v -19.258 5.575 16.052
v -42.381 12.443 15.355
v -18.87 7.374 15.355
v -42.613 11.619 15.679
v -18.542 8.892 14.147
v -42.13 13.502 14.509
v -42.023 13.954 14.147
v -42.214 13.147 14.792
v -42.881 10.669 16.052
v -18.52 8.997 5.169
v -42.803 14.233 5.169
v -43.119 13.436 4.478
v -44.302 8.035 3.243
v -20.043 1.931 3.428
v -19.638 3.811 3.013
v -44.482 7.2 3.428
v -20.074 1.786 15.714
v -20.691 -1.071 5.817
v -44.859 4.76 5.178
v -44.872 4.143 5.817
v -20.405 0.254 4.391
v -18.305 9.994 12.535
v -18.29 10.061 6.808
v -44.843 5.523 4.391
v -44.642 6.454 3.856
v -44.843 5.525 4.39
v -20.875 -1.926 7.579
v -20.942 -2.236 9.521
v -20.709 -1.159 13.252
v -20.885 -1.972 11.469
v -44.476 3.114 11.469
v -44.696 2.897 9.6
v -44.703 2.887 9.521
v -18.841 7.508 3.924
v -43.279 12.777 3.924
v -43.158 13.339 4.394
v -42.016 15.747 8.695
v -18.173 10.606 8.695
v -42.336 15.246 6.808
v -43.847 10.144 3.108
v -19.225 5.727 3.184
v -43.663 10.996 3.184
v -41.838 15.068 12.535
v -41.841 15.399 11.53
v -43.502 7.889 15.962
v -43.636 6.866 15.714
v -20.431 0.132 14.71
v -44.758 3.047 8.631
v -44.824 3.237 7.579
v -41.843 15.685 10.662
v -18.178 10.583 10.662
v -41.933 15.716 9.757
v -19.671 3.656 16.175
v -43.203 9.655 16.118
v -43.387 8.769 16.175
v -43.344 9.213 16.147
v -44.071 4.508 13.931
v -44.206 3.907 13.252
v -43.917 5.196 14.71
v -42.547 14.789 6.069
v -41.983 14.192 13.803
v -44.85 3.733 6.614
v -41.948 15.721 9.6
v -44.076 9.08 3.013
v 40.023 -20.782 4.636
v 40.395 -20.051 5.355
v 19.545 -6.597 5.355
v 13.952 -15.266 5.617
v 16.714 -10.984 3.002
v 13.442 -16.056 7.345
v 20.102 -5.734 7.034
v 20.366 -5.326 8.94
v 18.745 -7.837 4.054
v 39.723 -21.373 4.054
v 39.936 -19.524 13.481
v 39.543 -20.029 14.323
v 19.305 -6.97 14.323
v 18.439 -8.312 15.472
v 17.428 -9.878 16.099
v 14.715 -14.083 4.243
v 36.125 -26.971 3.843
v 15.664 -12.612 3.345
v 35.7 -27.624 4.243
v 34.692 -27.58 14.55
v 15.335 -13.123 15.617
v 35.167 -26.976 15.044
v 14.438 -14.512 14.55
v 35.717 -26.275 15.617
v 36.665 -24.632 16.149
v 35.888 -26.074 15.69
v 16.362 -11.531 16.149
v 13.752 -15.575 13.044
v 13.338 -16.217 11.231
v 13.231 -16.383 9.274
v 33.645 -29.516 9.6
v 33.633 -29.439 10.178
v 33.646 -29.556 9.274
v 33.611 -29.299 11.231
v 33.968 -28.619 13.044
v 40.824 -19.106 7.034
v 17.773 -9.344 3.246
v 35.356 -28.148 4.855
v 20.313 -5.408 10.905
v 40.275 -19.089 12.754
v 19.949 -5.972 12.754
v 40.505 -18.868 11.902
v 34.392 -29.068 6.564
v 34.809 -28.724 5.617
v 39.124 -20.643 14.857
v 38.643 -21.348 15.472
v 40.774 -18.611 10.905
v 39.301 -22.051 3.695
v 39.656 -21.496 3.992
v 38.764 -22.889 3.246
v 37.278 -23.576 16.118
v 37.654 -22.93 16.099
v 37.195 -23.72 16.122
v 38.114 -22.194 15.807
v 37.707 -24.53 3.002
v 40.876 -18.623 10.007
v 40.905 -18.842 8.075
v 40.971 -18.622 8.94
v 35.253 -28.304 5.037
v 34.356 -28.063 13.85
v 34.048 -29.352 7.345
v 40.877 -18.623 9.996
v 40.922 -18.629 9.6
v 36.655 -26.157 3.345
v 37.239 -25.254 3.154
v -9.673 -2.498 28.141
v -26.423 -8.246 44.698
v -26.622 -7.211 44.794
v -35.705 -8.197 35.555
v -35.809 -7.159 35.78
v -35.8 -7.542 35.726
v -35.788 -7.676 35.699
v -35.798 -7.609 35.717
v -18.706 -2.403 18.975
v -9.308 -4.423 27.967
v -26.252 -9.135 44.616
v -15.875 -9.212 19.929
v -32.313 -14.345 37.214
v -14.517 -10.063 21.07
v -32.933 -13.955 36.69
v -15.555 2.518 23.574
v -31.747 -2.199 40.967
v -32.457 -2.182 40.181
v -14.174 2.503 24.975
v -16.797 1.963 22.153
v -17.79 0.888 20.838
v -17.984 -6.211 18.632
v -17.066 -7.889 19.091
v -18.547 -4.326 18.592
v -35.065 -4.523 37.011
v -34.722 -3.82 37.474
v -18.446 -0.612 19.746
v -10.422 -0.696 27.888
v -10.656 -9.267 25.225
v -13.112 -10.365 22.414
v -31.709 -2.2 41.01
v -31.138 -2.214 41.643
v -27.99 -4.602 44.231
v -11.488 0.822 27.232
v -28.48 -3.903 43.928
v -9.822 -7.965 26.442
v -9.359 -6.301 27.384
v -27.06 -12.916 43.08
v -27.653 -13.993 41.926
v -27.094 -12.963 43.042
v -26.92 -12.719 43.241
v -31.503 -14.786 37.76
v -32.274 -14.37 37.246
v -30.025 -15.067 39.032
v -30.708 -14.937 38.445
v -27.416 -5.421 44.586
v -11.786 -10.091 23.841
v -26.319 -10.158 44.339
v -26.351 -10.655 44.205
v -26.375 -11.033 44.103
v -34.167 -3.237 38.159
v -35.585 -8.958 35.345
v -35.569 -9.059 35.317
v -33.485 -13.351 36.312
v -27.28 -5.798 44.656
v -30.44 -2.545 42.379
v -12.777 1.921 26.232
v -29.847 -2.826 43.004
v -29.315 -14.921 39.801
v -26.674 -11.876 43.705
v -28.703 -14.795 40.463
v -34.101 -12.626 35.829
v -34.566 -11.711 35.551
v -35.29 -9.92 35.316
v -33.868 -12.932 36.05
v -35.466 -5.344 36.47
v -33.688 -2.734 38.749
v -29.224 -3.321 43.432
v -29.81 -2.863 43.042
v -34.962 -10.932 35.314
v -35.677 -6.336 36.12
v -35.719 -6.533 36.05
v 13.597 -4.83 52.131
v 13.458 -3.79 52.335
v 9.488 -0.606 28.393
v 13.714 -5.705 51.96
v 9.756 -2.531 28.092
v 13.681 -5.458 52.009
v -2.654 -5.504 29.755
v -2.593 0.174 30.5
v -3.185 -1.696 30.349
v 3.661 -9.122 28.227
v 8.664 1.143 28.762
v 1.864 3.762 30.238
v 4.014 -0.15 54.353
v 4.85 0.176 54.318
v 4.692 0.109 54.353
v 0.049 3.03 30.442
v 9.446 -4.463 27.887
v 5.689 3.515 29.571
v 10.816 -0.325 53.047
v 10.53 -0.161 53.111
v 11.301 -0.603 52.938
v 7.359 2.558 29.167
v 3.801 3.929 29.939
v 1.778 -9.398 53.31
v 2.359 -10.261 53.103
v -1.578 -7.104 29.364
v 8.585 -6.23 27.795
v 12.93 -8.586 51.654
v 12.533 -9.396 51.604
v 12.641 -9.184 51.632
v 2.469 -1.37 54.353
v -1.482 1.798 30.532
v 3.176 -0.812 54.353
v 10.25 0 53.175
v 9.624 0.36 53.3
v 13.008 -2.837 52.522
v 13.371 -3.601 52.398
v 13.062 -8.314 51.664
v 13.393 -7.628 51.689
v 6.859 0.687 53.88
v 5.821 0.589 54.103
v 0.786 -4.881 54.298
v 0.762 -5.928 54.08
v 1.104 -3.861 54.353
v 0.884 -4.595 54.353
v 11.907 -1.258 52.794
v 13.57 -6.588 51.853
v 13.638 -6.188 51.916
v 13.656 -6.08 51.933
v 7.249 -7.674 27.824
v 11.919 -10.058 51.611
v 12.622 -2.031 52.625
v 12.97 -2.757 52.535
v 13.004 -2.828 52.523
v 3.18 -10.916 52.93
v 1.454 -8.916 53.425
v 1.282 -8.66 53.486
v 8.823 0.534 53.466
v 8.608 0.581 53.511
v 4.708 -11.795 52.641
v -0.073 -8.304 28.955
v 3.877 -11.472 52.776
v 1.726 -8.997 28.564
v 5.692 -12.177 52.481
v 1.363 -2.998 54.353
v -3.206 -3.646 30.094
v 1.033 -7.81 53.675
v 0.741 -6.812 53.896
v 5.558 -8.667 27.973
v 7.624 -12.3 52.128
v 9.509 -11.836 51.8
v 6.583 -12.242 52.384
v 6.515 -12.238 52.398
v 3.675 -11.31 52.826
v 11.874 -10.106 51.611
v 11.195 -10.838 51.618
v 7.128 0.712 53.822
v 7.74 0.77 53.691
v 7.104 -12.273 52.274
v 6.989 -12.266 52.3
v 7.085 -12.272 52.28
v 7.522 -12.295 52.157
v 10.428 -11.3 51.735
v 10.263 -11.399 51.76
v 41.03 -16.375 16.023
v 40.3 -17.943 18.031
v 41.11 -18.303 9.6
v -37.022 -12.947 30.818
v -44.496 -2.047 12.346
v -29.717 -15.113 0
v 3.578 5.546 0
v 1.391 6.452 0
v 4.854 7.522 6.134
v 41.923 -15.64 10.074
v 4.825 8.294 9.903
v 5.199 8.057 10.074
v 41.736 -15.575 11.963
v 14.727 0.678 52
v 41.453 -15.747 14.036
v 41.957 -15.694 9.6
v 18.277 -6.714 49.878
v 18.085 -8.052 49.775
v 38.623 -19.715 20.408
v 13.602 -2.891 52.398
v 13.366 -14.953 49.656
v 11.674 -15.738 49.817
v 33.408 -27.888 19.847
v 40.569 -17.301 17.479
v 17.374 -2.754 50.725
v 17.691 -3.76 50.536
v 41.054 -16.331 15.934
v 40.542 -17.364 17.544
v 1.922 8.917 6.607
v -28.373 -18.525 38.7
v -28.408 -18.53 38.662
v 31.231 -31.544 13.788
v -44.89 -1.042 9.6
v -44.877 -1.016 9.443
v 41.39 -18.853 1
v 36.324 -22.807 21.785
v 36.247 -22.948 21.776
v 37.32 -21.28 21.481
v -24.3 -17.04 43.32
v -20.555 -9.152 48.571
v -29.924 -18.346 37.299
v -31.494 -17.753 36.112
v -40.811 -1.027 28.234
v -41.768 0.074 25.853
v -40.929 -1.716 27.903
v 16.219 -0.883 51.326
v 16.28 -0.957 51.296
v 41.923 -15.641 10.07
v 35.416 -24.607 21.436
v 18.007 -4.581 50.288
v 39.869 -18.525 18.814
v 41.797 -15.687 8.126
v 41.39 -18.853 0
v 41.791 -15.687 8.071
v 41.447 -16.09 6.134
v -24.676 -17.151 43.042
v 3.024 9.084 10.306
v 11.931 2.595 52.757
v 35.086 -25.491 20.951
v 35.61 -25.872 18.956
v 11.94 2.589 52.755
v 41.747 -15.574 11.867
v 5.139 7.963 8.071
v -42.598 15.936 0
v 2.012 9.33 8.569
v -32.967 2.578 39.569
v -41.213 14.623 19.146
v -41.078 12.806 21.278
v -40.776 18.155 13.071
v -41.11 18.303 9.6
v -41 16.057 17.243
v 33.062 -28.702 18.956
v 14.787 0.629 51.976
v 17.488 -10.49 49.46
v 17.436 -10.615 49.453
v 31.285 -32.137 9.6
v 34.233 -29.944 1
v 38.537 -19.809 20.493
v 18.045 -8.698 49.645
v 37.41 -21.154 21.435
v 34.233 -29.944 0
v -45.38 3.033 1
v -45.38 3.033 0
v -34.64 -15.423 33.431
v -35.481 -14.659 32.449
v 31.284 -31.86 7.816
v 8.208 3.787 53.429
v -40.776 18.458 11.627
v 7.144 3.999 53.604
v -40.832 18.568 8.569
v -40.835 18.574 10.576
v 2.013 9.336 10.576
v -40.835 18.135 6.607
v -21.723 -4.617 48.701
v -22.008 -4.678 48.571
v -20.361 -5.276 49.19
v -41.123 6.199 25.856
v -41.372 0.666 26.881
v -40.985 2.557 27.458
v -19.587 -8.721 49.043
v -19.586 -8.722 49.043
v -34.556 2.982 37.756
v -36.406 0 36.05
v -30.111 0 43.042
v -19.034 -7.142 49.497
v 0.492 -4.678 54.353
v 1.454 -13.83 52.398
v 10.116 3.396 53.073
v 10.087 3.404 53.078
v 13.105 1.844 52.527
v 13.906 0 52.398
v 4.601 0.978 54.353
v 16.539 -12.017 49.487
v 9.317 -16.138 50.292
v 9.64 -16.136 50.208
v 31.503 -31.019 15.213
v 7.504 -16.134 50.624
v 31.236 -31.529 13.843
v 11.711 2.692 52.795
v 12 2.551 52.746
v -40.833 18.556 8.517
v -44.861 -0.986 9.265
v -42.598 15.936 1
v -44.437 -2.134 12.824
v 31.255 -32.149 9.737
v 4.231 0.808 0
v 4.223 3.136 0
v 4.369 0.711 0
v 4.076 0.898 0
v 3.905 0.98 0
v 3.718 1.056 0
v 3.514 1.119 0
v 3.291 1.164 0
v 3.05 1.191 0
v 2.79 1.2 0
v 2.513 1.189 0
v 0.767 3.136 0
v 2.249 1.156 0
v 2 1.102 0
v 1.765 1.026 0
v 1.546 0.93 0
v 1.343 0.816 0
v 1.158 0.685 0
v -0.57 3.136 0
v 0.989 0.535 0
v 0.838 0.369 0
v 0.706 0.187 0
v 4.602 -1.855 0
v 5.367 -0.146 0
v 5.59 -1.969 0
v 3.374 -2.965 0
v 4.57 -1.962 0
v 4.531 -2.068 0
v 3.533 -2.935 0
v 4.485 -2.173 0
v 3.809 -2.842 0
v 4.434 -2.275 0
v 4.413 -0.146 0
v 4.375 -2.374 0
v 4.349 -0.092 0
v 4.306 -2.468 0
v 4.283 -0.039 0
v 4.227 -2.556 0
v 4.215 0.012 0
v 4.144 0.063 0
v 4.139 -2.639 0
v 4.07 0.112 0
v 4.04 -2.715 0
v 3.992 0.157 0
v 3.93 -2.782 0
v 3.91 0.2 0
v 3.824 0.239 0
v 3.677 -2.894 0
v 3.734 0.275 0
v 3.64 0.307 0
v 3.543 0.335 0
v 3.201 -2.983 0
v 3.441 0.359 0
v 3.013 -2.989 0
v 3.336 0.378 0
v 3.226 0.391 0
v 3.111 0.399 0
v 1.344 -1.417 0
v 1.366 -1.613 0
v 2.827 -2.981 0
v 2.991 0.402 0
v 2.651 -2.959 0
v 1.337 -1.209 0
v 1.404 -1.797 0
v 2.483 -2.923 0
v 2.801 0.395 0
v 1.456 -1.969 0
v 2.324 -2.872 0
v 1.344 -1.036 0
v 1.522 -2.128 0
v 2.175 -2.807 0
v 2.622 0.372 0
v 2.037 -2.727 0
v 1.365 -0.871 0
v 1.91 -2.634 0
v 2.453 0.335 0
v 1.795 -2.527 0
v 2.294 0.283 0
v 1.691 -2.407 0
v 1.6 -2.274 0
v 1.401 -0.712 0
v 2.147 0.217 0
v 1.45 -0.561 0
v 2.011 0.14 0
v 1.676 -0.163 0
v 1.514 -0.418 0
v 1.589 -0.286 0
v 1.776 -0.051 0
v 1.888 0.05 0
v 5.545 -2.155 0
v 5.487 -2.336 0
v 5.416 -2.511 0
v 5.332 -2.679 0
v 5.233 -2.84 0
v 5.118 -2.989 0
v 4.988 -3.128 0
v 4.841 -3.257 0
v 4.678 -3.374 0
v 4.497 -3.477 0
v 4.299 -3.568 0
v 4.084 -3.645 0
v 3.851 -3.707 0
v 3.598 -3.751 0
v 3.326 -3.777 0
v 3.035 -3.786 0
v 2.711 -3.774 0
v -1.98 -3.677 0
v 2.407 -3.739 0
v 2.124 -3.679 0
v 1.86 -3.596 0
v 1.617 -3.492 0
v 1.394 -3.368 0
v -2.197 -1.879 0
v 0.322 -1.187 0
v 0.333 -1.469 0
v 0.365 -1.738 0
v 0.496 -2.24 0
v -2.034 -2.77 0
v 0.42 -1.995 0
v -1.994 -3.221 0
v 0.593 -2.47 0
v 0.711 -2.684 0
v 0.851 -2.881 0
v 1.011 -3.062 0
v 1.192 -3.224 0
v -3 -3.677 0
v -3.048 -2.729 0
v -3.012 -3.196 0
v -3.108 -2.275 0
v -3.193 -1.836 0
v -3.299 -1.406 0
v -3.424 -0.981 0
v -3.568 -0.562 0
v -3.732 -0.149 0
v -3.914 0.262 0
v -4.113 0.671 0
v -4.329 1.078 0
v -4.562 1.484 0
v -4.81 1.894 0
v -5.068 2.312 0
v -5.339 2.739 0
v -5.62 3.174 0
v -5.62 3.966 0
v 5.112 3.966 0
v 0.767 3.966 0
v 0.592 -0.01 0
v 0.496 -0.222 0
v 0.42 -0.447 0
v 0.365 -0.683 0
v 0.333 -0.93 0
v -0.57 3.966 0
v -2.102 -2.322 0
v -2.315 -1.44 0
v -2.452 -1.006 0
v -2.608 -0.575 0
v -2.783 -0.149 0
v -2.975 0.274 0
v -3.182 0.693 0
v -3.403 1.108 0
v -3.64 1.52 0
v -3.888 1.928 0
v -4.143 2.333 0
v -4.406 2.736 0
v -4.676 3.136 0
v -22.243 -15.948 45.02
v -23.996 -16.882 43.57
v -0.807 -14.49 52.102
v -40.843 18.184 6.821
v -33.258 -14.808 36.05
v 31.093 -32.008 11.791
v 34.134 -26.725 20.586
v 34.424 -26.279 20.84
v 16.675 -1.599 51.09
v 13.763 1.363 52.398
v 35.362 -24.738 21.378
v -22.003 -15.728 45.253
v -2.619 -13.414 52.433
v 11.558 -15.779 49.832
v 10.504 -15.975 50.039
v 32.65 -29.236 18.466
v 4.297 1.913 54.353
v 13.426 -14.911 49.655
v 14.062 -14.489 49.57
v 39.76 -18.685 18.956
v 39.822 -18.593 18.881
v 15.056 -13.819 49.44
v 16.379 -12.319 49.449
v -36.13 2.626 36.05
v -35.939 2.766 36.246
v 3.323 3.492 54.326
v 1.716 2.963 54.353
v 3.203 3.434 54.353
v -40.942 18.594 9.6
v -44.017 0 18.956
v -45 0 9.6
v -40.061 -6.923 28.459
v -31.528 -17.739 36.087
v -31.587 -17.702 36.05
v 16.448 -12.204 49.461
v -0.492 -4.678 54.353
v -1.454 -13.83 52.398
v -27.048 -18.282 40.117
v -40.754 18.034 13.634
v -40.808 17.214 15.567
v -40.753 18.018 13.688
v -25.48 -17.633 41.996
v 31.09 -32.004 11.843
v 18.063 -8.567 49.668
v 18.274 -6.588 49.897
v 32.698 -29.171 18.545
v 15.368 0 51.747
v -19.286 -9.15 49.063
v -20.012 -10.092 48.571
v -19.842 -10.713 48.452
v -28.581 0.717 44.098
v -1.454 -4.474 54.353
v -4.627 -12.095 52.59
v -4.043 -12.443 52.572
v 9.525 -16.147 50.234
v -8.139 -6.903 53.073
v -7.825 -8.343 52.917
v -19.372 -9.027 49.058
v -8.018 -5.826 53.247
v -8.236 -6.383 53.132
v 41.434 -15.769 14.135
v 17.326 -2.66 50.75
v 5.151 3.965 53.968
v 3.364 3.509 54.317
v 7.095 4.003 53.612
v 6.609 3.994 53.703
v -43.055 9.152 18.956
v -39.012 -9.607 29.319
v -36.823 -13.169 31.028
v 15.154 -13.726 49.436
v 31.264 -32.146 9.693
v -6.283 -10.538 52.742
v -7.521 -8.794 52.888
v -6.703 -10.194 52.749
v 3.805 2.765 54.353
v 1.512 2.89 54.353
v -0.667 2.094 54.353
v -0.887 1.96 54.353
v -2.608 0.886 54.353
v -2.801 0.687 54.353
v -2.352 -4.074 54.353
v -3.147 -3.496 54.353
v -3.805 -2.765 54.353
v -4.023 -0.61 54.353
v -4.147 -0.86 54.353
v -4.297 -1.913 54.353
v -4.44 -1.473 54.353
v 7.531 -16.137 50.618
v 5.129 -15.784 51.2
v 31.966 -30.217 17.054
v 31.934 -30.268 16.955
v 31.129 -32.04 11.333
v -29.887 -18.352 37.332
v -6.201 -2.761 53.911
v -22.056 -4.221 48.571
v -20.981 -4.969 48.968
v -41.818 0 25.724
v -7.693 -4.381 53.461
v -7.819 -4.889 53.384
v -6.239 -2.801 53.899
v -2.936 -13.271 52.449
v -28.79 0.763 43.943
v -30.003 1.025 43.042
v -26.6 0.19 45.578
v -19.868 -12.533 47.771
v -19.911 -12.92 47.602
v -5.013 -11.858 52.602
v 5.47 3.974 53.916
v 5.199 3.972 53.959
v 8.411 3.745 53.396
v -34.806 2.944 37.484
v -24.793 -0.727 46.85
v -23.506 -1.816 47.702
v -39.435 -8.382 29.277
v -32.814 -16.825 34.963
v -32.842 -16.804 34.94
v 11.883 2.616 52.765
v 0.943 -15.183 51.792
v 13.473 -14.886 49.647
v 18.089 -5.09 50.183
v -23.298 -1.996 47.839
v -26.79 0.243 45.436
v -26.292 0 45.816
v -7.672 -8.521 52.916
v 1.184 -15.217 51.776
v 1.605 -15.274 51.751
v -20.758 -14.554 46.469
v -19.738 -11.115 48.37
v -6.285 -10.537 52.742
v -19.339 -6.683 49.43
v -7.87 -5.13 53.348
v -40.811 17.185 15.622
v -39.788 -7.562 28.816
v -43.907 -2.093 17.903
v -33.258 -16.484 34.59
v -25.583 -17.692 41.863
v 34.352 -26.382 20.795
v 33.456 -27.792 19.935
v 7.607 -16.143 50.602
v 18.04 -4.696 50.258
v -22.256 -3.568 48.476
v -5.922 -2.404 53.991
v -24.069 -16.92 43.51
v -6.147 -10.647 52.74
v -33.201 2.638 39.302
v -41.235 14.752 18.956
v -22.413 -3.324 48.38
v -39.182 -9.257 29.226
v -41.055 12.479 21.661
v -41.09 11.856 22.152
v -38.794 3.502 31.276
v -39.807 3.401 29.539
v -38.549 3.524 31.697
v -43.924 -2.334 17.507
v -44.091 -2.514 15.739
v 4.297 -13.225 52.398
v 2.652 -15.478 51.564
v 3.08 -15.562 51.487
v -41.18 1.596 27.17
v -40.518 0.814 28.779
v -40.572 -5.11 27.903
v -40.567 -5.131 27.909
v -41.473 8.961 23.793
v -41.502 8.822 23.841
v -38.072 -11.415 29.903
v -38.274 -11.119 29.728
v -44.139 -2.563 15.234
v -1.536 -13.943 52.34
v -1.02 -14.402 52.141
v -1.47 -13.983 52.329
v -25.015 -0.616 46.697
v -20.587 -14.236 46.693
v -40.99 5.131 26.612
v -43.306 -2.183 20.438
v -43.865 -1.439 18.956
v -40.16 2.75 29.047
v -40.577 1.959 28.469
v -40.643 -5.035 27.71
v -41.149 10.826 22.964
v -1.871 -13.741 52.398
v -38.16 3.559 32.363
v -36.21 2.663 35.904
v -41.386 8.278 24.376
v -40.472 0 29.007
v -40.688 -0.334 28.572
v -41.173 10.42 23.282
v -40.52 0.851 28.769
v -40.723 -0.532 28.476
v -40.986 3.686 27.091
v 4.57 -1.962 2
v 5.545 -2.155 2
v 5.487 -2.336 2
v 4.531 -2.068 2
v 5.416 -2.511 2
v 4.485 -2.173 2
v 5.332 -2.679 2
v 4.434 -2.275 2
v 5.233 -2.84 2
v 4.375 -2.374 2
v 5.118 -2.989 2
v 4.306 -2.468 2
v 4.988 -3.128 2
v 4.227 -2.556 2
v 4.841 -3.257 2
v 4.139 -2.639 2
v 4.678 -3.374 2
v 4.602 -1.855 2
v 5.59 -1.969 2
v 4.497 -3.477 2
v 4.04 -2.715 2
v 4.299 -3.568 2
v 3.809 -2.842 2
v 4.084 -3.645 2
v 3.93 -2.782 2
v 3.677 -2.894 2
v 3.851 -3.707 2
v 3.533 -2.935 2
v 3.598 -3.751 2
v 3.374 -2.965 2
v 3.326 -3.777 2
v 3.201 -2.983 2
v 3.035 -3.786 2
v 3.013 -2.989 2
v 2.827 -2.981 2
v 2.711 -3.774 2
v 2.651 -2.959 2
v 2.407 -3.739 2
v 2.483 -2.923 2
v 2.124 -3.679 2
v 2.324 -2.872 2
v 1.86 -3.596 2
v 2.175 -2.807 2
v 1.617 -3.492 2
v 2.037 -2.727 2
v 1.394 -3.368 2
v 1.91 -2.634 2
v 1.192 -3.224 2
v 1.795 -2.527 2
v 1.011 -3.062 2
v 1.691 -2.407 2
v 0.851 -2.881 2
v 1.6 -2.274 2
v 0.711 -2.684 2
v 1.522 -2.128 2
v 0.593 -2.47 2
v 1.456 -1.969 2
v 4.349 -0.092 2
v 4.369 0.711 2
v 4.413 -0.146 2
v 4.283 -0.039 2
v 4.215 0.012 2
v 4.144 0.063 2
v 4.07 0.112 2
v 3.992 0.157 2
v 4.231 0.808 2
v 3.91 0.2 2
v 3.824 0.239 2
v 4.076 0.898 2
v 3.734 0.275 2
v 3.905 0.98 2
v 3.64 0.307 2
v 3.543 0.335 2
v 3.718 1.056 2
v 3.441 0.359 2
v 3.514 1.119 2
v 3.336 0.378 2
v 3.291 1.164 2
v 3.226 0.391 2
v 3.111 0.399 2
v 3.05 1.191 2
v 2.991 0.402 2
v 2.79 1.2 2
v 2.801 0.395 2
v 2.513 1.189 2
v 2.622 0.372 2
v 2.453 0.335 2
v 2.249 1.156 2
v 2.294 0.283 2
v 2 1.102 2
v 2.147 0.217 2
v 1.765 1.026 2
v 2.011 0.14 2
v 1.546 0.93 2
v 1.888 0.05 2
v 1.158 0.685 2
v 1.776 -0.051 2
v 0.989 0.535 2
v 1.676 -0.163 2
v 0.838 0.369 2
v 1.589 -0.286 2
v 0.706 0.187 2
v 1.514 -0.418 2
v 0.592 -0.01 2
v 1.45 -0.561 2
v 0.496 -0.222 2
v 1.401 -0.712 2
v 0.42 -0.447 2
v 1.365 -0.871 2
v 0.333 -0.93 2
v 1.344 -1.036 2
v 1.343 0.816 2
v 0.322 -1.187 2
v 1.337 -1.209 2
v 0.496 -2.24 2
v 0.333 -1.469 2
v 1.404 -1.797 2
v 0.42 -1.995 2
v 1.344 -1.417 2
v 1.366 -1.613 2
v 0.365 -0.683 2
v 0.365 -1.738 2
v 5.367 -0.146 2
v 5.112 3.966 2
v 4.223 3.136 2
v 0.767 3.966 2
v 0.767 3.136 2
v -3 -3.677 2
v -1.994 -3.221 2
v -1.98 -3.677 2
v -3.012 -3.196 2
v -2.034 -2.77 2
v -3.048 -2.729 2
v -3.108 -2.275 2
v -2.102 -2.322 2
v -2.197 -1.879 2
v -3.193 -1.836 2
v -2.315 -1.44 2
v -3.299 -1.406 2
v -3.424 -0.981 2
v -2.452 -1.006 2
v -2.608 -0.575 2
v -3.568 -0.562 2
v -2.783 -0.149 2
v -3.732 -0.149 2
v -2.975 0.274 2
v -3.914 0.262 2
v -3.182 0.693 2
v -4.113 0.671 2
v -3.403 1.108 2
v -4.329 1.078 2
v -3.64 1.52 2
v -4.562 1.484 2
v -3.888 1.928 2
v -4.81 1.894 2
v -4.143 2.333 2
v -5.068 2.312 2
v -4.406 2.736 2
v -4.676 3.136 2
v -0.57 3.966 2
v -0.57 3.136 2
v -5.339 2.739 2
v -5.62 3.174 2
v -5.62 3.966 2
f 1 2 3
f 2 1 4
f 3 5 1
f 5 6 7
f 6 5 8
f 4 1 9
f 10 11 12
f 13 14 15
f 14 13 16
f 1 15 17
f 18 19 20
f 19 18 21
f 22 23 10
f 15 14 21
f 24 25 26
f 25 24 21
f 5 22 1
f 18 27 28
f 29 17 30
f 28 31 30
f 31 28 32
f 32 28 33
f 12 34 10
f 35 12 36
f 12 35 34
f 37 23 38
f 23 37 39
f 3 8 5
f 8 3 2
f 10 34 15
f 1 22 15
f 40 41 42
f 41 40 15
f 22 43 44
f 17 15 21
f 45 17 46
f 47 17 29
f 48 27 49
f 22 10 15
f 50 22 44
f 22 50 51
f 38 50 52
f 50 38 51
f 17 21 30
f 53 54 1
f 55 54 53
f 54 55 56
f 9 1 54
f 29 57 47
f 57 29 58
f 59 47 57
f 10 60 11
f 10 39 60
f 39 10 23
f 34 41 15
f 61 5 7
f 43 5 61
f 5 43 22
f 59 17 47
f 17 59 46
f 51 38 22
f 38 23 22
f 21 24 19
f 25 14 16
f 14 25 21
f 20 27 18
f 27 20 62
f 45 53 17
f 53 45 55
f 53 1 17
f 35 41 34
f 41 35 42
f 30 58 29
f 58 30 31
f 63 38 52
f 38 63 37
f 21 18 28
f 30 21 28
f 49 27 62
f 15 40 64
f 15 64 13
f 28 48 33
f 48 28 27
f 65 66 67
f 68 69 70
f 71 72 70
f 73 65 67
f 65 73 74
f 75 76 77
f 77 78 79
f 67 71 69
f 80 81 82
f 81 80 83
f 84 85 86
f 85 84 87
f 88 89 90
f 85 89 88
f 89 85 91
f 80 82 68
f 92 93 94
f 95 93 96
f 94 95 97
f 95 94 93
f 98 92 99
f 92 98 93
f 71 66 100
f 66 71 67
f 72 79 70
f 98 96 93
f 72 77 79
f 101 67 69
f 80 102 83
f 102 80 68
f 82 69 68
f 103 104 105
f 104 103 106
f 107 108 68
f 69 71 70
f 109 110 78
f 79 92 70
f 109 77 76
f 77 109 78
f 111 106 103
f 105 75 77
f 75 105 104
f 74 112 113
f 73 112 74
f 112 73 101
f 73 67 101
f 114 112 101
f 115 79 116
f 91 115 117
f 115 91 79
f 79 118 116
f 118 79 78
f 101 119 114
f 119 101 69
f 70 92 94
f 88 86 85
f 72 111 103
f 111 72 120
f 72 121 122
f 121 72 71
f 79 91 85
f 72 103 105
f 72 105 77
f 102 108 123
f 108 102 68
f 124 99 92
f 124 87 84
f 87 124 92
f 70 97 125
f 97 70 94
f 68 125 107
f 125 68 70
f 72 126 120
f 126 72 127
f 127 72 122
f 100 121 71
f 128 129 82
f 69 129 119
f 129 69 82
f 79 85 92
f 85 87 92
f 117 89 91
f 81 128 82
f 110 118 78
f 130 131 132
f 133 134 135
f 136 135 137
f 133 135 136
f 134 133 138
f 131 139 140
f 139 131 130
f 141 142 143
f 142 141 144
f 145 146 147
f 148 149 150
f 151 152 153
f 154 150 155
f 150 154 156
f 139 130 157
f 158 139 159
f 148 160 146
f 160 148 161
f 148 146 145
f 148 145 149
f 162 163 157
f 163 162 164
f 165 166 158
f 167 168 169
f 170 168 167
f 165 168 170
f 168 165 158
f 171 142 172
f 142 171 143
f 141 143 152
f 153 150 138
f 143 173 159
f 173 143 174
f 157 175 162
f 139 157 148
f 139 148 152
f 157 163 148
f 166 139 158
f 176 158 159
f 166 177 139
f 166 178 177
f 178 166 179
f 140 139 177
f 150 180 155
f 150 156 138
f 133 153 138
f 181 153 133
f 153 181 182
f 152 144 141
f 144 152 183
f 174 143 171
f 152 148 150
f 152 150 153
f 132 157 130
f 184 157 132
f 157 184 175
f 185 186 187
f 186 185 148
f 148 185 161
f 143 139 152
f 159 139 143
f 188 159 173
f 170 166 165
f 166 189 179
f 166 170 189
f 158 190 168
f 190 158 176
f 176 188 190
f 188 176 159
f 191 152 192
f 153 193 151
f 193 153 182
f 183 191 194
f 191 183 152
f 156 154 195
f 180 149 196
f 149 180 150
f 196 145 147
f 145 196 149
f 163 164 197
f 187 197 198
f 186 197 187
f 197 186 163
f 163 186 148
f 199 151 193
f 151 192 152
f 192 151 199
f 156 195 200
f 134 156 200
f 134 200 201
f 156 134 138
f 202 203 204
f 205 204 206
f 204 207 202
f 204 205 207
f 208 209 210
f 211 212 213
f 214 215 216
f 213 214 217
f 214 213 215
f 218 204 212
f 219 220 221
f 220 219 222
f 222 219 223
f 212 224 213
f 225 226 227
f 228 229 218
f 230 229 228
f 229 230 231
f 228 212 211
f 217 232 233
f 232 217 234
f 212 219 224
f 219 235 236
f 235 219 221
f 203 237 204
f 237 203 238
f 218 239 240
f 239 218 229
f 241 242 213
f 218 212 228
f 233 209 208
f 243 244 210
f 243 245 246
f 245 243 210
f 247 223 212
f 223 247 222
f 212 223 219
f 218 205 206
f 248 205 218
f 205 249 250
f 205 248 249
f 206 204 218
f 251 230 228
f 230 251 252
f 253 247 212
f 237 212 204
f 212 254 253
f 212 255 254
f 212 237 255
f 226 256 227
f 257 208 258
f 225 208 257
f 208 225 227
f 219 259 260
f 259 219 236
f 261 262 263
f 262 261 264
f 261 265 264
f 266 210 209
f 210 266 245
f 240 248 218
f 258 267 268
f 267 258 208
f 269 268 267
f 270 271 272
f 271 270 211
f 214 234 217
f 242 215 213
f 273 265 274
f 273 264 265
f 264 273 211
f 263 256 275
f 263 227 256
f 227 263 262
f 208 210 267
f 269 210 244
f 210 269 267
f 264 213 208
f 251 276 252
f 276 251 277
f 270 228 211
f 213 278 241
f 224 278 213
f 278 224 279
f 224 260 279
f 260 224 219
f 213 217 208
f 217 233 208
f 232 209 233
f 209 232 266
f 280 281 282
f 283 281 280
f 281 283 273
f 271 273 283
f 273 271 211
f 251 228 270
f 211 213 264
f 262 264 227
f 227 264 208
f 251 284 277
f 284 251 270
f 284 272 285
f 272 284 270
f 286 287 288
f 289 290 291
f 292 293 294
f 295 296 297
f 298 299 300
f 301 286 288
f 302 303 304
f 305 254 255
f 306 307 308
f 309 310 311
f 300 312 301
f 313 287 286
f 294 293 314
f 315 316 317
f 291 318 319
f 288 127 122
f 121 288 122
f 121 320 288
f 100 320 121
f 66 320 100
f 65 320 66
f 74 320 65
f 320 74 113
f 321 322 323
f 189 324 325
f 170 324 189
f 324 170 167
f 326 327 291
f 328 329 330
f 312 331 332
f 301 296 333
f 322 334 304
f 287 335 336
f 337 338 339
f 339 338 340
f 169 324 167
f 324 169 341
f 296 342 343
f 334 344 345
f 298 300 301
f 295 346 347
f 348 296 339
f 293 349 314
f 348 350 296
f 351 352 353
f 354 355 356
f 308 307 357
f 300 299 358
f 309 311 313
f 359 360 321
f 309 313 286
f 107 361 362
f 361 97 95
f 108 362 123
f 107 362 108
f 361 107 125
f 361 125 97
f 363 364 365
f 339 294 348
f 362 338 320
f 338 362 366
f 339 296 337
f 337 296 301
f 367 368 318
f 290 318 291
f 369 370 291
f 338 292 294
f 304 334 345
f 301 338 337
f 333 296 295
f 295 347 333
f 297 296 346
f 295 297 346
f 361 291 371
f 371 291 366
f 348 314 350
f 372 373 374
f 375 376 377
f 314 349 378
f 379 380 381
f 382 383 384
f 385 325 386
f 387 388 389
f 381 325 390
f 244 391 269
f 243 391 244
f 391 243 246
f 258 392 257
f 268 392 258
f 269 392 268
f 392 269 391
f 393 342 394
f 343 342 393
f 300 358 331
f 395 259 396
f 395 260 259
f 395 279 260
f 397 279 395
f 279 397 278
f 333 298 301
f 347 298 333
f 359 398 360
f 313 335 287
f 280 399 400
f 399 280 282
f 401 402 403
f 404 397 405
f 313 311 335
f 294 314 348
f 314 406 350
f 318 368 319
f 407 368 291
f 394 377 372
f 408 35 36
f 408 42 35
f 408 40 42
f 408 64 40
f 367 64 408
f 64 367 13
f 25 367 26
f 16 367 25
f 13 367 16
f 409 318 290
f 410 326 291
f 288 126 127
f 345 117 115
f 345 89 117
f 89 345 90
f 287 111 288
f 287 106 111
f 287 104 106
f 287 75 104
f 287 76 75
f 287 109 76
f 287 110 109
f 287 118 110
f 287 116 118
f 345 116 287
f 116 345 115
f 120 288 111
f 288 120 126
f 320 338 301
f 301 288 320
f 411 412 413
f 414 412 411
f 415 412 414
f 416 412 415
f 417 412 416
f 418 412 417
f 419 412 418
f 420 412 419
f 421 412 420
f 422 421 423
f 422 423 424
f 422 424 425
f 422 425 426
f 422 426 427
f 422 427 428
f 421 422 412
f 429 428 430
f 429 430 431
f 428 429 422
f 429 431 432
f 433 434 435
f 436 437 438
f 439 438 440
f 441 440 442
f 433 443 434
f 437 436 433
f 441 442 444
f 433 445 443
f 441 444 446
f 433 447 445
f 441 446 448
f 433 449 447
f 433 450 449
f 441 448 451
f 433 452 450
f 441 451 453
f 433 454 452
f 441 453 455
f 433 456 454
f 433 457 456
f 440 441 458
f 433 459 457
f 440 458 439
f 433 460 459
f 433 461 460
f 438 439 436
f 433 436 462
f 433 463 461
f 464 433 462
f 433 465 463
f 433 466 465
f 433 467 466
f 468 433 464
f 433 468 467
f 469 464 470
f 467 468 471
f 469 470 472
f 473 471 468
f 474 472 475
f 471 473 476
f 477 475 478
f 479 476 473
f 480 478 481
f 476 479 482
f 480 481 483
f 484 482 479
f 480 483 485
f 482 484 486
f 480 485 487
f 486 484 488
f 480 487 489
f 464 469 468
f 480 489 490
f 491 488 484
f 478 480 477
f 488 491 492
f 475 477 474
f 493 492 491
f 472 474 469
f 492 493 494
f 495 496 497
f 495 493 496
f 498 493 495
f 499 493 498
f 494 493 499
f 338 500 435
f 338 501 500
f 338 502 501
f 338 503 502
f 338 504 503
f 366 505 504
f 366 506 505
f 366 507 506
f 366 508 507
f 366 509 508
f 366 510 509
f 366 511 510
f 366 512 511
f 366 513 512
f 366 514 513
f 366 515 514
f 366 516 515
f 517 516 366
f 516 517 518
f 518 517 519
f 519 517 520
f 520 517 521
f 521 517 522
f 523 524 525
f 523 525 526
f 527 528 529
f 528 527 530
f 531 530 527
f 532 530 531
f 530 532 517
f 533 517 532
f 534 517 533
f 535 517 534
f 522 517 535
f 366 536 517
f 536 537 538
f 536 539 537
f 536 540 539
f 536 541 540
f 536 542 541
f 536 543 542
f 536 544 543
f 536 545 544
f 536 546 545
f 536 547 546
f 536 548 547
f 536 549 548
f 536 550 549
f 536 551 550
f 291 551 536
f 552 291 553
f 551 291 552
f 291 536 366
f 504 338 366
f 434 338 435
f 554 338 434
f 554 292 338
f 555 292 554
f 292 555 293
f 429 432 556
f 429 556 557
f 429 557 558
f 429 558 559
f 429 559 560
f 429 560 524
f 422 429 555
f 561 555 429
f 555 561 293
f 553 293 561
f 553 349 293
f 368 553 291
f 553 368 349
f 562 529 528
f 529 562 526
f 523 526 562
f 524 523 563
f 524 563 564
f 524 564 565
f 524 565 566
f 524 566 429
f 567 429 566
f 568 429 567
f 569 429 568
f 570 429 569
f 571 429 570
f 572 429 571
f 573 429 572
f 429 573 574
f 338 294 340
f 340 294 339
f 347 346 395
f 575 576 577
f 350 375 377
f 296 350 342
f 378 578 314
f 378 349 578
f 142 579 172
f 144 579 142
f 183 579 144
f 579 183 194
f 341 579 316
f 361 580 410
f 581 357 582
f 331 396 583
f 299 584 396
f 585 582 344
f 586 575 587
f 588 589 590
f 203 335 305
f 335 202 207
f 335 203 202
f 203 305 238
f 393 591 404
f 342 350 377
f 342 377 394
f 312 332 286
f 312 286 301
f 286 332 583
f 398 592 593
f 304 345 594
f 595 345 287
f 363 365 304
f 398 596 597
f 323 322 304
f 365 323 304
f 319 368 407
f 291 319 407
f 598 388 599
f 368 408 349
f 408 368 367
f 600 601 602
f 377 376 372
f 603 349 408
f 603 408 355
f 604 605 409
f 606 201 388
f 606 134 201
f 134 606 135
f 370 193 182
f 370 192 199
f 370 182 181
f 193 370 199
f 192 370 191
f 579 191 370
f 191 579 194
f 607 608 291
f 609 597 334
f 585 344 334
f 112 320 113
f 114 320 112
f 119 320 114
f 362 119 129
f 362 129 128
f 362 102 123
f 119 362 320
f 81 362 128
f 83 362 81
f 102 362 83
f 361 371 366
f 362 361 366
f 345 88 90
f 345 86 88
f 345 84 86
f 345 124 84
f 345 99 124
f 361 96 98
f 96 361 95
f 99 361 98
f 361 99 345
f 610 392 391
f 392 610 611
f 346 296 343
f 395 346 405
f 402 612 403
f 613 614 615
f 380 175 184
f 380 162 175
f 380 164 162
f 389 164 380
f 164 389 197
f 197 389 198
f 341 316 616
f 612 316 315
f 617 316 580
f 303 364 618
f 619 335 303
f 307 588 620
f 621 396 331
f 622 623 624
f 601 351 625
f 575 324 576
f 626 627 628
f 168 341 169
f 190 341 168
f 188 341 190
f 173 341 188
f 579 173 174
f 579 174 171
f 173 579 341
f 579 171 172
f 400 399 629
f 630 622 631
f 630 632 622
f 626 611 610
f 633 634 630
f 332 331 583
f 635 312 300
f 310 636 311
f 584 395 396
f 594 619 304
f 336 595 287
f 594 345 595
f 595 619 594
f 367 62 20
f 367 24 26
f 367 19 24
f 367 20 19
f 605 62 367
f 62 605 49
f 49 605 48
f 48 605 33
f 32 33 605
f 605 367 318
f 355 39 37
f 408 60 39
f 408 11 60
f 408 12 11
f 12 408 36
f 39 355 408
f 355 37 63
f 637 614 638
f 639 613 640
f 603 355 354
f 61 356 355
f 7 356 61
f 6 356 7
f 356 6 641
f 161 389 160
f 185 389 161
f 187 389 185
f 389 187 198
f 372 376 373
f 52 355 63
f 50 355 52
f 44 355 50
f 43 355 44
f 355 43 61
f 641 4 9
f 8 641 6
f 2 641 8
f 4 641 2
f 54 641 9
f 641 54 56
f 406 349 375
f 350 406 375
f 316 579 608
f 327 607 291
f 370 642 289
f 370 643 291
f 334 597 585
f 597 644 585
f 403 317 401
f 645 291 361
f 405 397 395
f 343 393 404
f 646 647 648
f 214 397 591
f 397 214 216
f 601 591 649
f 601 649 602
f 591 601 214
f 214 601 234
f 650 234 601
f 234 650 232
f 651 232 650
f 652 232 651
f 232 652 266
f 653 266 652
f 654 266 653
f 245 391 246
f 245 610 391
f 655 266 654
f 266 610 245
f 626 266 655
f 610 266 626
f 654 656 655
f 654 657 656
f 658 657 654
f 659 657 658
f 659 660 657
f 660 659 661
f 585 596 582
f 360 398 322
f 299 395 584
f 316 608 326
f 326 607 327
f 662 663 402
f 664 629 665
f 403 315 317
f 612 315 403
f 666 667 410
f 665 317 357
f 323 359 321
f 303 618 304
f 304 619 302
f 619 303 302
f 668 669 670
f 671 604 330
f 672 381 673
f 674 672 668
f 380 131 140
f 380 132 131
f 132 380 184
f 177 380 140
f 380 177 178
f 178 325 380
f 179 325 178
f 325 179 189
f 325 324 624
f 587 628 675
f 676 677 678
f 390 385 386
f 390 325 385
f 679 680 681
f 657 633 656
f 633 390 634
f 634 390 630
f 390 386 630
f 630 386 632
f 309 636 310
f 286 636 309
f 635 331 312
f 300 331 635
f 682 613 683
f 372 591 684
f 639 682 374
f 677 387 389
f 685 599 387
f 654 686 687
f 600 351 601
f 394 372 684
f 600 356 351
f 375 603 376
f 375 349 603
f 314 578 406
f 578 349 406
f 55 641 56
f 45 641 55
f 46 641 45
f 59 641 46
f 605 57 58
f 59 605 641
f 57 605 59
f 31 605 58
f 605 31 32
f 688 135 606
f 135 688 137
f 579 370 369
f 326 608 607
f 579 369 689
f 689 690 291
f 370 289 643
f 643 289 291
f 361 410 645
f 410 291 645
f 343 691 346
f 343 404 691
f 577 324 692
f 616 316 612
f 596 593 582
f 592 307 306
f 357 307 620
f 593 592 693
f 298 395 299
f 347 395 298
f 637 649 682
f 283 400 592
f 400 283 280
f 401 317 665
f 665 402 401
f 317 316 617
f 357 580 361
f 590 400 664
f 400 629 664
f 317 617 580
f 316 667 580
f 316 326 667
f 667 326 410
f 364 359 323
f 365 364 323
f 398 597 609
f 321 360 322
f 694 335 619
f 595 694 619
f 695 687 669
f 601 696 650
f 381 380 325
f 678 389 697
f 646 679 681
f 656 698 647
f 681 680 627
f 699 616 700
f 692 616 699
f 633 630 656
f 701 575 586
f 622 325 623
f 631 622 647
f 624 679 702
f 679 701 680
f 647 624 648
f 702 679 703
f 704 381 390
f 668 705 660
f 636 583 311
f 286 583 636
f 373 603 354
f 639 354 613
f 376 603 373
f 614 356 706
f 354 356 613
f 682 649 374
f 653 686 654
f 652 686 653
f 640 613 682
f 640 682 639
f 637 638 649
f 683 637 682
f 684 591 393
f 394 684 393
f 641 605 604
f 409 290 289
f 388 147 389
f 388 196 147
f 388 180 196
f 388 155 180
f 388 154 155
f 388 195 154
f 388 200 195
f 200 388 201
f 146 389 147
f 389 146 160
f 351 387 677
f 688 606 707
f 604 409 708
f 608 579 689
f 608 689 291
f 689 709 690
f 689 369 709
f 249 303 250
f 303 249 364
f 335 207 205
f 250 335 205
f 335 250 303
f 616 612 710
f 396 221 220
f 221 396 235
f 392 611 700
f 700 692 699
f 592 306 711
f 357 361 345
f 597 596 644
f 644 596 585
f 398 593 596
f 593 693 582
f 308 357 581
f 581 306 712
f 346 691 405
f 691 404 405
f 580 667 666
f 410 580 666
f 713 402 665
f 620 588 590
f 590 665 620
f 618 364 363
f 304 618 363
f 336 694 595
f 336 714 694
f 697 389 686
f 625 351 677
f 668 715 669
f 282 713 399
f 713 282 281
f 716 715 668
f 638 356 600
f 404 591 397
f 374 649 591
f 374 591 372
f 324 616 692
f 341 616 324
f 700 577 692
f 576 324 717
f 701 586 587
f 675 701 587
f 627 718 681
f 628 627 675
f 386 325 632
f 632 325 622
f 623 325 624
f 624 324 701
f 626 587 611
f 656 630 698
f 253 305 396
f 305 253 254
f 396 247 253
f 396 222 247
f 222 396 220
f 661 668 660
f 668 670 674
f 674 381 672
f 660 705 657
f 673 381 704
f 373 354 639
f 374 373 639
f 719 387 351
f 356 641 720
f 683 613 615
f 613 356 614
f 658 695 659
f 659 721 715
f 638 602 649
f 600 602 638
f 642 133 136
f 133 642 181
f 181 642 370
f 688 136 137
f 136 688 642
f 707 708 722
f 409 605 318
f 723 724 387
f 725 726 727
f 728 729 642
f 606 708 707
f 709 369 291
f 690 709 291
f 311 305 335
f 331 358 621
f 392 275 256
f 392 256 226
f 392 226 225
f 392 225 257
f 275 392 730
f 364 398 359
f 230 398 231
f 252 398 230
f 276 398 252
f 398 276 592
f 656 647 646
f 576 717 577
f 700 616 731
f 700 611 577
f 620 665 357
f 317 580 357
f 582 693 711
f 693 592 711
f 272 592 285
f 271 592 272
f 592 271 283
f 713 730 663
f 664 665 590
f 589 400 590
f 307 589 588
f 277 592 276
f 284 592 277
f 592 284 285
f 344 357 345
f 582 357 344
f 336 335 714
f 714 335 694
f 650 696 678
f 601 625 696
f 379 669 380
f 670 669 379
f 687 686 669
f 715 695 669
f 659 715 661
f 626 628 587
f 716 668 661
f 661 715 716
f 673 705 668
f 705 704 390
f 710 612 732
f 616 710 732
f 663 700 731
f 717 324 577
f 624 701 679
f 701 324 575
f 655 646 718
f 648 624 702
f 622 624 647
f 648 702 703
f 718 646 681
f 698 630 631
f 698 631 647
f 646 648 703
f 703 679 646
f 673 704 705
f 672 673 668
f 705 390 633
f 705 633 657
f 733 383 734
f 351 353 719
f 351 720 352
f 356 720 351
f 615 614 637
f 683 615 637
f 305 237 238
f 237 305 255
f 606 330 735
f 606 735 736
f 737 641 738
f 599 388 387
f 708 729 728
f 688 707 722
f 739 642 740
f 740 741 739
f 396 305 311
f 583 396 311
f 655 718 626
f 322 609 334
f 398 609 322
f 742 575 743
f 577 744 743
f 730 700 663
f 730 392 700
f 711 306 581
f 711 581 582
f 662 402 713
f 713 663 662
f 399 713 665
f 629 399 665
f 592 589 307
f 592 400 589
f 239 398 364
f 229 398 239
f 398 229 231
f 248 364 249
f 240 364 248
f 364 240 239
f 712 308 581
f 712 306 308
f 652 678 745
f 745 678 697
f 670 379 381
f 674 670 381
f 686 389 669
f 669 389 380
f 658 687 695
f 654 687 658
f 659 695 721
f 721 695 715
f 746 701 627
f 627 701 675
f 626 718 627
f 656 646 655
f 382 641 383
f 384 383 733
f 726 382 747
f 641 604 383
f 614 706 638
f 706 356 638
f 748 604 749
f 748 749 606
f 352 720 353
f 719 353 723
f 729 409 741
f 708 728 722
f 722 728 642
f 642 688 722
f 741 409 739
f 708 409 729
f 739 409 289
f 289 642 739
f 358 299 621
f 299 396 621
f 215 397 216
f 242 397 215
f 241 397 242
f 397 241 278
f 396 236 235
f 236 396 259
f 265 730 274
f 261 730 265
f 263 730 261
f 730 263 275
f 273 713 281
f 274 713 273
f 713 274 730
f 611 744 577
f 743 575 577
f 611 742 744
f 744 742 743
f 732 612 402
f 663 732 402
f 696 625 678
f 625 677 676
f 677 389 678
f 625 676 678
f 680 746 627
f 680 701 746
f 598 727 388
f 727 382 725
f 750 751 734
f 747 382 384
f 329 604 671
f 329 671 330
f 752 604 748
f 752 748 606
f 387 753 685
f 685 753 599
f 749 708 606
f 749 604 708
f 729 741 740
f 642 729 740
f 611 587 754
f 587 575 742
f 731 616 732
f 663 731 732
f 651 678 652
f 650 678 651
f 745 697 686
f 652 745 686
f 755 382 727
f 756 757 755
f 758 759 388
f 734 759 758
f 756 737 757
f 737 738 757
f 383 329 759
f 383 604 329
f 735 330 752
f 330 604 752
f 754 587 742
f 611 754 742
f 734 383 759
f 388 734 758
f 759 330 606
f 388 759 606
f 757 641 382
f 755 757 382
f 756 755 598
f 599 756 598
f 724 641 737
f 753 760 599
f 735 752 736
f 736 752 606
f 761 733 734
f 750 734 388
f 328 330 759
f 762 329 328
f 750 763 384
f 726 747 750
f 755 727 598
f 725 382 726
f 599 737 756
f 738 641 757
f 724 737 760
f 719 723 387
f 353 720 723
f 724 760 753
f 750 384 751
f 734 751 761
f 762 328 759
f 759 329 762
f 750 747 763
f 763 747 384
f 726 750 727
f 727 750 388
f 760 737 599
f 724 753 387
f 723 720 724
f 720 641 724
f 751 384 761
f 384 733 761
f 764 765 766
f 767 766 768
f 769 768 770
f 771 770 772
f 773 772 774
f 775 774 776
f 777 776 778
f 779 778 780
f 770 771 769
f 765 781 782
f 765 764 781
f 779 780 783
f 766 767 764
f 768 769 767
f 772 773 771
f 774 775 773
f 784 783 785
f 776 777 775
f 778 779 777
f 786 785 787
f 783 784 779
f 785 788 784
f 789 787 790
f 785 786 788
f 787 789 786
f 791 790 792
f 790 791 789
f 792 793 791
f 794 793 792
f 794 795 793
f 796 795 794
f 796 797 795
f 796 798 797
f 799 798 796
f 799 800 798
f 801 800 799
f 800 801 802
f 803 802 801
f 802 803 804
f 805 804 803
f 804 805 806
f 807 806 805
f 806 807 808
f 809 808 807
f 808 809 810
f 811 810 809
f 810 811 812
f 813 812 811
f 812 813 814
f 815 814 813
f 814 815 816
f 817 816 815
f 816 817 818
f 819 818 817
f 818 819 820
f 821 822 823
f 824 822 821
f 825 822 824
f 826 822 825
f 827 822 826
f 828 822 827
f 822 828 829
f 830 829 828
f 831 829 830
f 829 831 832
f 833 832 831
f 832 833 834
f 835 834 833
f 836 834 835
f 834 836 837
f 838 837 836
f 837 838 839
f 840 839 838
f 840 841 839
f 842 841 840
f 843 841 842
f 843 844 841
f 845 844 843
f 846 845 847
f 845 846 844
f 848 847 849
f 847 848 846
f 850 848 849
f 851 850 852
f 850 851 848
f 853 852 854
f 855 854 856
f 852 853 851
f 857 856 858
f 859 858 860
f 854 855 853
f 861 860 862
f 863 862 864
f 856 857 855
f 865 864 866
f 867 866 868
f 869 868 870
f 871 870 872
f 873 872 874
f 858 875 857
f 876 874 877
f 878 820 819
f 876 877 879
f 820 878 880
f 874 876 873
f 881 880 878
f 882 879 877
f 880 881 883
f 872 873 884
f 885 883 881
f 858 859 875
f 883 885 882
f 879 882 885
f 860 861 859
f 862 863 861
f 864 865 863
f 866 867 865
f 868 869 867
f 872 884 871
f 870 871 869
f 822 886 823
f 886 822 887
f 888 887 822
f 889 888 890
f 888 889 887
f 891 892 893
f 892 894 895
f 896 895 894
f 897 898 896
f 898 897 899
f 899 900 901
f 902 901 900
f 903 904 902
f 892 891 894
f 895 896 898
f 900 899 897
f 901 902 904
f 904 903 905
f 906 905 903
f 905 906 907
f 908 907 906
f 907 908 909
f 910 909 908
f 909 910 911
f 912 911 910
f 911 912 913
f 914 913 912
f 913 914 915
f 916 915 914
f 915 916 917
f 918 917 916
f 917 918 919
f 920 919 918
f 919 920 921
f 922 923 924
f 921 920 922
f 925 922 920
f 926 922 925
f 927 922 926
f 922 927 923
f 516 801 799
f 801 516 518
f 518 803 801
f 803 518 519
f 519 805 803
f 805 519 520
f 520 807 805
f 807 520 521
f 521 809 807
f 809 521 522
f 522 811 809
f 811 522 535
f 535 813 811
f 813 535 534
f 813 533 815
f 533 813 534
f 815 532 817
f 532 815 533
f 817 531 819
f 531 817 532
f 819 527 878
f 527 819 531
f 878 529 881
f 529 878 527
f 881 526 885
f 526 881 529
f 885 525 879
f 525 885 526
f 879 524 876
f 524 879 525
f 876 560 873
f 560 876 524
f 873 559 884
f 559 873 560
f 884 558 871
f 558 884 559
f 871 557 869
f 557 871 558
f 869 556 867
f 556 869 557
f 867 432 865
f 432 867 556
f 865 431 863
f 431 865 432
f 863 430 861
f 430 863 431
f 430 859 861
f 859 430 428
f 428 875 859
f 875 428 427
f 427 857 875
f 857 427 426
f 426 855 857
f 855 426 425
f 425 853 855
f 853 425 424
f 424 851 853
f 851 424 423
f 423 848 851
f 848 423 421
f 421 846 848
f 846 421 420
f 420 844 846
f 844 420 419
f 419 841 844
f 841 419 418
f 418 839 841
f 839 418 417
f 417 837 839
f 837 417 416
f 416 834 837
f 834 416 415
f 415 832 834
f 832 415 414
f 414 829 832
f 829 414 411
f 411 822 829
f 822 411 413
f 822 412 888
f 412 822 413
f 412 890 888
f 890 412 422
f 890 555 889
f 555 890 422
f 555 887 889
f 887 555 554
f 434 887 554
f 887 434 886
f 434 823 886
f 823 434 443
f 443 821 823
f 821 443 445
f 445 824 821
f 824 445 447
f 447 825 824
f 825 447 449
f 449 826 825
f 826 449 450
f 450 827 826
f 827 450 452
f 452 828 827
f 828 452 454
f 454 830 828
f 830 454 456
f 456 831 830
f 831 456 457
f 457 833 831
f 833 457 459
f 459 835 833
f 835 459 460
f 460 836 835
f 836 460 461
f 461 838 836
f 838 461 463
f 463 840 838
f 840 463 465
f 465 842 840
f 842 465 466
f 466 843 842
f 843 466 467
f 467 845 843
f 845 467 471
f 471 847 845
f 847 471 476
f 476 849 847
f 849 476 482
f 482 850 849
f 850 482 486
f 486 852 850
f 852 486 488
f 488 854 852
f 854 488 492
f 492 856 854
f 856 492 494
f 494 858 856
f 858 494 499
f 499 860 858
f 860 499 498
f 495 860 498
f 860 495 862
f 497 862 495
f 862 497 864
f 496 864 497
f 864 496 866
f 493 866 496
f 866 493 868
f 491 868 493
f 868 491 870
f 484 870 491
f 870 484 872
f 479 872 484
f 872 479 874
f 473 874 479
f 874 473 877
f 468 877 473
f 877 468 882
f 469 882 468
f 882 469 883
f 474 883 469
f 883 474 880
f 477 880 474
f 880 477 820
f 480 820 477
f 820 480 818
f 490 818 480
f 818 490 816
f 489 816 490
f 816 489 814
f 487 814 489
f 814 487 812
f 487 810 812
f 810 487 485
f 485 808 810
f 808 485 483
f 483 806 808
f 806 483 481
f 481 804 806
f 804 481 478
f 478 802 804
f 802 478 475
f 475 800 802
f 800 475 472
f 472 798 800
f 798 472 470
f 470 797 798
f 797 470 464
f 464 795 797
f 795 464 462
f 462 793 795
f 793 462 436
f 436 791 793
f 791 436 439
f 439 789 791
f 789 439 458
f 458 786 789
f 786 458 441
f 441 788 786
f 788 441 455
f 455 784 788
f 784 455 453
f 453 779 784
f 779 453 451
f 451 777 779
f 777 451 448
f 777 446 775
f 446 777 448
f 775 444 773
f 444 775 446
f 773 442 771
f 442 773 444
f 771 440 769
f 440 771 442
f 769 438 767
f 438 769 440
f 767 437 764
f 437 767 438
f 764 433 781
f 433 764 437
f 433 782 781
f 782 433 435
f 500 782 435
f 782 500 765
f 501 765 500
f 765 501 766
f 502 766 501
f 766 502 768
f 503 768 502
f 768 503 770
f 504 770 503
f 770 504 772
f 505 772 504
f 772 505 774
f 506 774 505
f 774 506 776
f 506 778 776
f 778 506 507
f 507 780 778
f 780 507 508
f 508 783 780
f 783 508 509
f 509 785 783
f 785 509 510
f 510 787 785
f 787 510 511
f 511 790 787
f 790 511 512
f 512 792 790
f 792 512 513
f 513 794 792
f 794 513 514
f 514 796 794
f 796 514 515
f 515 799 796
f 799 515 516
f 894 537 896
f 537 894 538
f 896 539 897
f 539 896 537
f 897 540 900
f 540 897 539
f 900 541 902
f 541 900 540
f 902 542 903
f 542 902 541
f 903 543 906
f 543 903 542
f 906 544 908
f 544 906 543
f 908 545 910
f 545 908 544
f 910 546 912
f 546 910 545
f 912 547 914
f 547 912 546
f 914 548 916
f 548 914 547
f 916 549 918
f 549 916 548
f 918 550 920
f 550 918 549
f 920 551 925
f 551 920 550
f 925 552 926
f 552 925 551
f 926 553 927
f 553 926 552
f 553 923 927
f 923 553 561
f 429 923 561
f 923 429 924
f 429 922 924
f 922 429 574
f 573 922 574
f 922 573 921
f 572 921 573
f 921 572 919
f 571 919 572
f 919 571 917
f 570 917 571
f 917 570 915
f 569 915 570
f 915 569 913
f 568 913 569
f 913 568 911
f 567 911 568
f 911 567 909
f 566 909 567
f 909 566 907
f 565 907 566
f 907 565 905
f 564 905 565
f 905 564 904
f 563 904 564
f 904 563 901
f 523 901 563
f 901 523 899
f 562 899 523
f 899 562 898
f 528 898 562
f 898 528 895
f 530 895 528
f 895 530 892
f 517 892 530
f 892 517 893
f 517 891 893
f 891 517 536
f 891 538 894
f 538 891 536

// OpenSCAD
difference() {
	difference() {
		difference() {
			hull() {
				union() {
					union() {
						rotate(a = 167.8327390914, v = [0, 0, 1]) {
							translate(v = [0, -6.6000000000, 0]) {
								cube(size = [45.0000000000, 13.2000000000, 1]);
							}
						}
						rotate(a = -32.8327390914, v = [0, 0, 1]) {
							translate(v = [0, -6.6000000000, 0]) {
								cube(size = [45.0000000000, 13.2000000000, 1]);
							}
						}
						rotate(a = -164.4612324268, v = [0, 0, 1]) {
							translate(v = [0, -6.6000000000, 0]) {
								cube(size = [32.6794782309, 13.2000000000, 1]);
							}
						}
						rotate(a = -38.7276085319, v = [0, 0, 1]) {
							translate(v = [0, -6.6000000000, 0]) {
								cube(size = [9.3564493680, 13.2000000000, 1]);
							}
						}
					}
					translate(v = [0, 0, 9.6000034491]) {
						intersection() {
							hull() {
								rotate(a = 90.0000483242, v = [-0.2107662617, -0.9775364867, 0.0000011883]) {
									cylinder(h = 45, r = 9.6000000000);
								}
								rotate(a = 89.9999812148, v = [0.5421884257, 0.8402569315, -0.0000013824]) {
									cylinder(h = 45, r = 9.6000000000);
								}
								rotate(a = 46.5697216889, v = [0.1945454908, -0.6996678904, 0.0000005051]) {
									cylinder(h = 45, r = 9.6000000000);
								}
								rotate(a = 12.0005421264, v = [0.1300802925, 0.1622043072, -0.0000002923]) {
									cylinder(h = 45, r = 9.6000000000);
								}
							}
							sphere(r = 45);
						}
					}
				}
			}
			translate(v = [0, 0, 9.6000034491]) {
				rotate(a = 90.0000483242, v = [-0.2107662617, -0.9775364867, 0.0000011883]) {
					translate(v = [0, 0, 20]) {
						cylinder(h = 45, r = 6.6000000000);
					}
				}
				rotate(a = 89.9999812148, v = [0.5421884257, 0.8402569315, -0.0000013824]) {
					translate(v = [0, 0, 20]) {
						cylinder(h = 45, r = 6.6000000000);
					}
				}
				rotate(a = 46.5697216889, v = [0.1945454908, -0.6996678904, 0.0000005051]) {
					translate(v = [0, 0, 20]) {
						cylinder(h = 45, r = 6.6000000000);
					}
				}
				rotate(a = 12.0005421264, v = [0.1300802925, 0.1622043072, -0.0000002923]) {
					translate(v = [0, 0, 20]) {
						cylinder(h = 45, r = 6.6000000000);
					}
				}
			}
		}
		translate(v = [-100, -100, -100]) {
			cube(size = [200, 200, 100]);
		}
	}
	translate(v = [0, 0, 2]) {
		rotate(a = 180, v = [0, 1, 0]) {
			linear_extrude(height = 3) {
				text(halign = "center", size = 8, text = "57", valign = "center");
			}
		}
	}
}
